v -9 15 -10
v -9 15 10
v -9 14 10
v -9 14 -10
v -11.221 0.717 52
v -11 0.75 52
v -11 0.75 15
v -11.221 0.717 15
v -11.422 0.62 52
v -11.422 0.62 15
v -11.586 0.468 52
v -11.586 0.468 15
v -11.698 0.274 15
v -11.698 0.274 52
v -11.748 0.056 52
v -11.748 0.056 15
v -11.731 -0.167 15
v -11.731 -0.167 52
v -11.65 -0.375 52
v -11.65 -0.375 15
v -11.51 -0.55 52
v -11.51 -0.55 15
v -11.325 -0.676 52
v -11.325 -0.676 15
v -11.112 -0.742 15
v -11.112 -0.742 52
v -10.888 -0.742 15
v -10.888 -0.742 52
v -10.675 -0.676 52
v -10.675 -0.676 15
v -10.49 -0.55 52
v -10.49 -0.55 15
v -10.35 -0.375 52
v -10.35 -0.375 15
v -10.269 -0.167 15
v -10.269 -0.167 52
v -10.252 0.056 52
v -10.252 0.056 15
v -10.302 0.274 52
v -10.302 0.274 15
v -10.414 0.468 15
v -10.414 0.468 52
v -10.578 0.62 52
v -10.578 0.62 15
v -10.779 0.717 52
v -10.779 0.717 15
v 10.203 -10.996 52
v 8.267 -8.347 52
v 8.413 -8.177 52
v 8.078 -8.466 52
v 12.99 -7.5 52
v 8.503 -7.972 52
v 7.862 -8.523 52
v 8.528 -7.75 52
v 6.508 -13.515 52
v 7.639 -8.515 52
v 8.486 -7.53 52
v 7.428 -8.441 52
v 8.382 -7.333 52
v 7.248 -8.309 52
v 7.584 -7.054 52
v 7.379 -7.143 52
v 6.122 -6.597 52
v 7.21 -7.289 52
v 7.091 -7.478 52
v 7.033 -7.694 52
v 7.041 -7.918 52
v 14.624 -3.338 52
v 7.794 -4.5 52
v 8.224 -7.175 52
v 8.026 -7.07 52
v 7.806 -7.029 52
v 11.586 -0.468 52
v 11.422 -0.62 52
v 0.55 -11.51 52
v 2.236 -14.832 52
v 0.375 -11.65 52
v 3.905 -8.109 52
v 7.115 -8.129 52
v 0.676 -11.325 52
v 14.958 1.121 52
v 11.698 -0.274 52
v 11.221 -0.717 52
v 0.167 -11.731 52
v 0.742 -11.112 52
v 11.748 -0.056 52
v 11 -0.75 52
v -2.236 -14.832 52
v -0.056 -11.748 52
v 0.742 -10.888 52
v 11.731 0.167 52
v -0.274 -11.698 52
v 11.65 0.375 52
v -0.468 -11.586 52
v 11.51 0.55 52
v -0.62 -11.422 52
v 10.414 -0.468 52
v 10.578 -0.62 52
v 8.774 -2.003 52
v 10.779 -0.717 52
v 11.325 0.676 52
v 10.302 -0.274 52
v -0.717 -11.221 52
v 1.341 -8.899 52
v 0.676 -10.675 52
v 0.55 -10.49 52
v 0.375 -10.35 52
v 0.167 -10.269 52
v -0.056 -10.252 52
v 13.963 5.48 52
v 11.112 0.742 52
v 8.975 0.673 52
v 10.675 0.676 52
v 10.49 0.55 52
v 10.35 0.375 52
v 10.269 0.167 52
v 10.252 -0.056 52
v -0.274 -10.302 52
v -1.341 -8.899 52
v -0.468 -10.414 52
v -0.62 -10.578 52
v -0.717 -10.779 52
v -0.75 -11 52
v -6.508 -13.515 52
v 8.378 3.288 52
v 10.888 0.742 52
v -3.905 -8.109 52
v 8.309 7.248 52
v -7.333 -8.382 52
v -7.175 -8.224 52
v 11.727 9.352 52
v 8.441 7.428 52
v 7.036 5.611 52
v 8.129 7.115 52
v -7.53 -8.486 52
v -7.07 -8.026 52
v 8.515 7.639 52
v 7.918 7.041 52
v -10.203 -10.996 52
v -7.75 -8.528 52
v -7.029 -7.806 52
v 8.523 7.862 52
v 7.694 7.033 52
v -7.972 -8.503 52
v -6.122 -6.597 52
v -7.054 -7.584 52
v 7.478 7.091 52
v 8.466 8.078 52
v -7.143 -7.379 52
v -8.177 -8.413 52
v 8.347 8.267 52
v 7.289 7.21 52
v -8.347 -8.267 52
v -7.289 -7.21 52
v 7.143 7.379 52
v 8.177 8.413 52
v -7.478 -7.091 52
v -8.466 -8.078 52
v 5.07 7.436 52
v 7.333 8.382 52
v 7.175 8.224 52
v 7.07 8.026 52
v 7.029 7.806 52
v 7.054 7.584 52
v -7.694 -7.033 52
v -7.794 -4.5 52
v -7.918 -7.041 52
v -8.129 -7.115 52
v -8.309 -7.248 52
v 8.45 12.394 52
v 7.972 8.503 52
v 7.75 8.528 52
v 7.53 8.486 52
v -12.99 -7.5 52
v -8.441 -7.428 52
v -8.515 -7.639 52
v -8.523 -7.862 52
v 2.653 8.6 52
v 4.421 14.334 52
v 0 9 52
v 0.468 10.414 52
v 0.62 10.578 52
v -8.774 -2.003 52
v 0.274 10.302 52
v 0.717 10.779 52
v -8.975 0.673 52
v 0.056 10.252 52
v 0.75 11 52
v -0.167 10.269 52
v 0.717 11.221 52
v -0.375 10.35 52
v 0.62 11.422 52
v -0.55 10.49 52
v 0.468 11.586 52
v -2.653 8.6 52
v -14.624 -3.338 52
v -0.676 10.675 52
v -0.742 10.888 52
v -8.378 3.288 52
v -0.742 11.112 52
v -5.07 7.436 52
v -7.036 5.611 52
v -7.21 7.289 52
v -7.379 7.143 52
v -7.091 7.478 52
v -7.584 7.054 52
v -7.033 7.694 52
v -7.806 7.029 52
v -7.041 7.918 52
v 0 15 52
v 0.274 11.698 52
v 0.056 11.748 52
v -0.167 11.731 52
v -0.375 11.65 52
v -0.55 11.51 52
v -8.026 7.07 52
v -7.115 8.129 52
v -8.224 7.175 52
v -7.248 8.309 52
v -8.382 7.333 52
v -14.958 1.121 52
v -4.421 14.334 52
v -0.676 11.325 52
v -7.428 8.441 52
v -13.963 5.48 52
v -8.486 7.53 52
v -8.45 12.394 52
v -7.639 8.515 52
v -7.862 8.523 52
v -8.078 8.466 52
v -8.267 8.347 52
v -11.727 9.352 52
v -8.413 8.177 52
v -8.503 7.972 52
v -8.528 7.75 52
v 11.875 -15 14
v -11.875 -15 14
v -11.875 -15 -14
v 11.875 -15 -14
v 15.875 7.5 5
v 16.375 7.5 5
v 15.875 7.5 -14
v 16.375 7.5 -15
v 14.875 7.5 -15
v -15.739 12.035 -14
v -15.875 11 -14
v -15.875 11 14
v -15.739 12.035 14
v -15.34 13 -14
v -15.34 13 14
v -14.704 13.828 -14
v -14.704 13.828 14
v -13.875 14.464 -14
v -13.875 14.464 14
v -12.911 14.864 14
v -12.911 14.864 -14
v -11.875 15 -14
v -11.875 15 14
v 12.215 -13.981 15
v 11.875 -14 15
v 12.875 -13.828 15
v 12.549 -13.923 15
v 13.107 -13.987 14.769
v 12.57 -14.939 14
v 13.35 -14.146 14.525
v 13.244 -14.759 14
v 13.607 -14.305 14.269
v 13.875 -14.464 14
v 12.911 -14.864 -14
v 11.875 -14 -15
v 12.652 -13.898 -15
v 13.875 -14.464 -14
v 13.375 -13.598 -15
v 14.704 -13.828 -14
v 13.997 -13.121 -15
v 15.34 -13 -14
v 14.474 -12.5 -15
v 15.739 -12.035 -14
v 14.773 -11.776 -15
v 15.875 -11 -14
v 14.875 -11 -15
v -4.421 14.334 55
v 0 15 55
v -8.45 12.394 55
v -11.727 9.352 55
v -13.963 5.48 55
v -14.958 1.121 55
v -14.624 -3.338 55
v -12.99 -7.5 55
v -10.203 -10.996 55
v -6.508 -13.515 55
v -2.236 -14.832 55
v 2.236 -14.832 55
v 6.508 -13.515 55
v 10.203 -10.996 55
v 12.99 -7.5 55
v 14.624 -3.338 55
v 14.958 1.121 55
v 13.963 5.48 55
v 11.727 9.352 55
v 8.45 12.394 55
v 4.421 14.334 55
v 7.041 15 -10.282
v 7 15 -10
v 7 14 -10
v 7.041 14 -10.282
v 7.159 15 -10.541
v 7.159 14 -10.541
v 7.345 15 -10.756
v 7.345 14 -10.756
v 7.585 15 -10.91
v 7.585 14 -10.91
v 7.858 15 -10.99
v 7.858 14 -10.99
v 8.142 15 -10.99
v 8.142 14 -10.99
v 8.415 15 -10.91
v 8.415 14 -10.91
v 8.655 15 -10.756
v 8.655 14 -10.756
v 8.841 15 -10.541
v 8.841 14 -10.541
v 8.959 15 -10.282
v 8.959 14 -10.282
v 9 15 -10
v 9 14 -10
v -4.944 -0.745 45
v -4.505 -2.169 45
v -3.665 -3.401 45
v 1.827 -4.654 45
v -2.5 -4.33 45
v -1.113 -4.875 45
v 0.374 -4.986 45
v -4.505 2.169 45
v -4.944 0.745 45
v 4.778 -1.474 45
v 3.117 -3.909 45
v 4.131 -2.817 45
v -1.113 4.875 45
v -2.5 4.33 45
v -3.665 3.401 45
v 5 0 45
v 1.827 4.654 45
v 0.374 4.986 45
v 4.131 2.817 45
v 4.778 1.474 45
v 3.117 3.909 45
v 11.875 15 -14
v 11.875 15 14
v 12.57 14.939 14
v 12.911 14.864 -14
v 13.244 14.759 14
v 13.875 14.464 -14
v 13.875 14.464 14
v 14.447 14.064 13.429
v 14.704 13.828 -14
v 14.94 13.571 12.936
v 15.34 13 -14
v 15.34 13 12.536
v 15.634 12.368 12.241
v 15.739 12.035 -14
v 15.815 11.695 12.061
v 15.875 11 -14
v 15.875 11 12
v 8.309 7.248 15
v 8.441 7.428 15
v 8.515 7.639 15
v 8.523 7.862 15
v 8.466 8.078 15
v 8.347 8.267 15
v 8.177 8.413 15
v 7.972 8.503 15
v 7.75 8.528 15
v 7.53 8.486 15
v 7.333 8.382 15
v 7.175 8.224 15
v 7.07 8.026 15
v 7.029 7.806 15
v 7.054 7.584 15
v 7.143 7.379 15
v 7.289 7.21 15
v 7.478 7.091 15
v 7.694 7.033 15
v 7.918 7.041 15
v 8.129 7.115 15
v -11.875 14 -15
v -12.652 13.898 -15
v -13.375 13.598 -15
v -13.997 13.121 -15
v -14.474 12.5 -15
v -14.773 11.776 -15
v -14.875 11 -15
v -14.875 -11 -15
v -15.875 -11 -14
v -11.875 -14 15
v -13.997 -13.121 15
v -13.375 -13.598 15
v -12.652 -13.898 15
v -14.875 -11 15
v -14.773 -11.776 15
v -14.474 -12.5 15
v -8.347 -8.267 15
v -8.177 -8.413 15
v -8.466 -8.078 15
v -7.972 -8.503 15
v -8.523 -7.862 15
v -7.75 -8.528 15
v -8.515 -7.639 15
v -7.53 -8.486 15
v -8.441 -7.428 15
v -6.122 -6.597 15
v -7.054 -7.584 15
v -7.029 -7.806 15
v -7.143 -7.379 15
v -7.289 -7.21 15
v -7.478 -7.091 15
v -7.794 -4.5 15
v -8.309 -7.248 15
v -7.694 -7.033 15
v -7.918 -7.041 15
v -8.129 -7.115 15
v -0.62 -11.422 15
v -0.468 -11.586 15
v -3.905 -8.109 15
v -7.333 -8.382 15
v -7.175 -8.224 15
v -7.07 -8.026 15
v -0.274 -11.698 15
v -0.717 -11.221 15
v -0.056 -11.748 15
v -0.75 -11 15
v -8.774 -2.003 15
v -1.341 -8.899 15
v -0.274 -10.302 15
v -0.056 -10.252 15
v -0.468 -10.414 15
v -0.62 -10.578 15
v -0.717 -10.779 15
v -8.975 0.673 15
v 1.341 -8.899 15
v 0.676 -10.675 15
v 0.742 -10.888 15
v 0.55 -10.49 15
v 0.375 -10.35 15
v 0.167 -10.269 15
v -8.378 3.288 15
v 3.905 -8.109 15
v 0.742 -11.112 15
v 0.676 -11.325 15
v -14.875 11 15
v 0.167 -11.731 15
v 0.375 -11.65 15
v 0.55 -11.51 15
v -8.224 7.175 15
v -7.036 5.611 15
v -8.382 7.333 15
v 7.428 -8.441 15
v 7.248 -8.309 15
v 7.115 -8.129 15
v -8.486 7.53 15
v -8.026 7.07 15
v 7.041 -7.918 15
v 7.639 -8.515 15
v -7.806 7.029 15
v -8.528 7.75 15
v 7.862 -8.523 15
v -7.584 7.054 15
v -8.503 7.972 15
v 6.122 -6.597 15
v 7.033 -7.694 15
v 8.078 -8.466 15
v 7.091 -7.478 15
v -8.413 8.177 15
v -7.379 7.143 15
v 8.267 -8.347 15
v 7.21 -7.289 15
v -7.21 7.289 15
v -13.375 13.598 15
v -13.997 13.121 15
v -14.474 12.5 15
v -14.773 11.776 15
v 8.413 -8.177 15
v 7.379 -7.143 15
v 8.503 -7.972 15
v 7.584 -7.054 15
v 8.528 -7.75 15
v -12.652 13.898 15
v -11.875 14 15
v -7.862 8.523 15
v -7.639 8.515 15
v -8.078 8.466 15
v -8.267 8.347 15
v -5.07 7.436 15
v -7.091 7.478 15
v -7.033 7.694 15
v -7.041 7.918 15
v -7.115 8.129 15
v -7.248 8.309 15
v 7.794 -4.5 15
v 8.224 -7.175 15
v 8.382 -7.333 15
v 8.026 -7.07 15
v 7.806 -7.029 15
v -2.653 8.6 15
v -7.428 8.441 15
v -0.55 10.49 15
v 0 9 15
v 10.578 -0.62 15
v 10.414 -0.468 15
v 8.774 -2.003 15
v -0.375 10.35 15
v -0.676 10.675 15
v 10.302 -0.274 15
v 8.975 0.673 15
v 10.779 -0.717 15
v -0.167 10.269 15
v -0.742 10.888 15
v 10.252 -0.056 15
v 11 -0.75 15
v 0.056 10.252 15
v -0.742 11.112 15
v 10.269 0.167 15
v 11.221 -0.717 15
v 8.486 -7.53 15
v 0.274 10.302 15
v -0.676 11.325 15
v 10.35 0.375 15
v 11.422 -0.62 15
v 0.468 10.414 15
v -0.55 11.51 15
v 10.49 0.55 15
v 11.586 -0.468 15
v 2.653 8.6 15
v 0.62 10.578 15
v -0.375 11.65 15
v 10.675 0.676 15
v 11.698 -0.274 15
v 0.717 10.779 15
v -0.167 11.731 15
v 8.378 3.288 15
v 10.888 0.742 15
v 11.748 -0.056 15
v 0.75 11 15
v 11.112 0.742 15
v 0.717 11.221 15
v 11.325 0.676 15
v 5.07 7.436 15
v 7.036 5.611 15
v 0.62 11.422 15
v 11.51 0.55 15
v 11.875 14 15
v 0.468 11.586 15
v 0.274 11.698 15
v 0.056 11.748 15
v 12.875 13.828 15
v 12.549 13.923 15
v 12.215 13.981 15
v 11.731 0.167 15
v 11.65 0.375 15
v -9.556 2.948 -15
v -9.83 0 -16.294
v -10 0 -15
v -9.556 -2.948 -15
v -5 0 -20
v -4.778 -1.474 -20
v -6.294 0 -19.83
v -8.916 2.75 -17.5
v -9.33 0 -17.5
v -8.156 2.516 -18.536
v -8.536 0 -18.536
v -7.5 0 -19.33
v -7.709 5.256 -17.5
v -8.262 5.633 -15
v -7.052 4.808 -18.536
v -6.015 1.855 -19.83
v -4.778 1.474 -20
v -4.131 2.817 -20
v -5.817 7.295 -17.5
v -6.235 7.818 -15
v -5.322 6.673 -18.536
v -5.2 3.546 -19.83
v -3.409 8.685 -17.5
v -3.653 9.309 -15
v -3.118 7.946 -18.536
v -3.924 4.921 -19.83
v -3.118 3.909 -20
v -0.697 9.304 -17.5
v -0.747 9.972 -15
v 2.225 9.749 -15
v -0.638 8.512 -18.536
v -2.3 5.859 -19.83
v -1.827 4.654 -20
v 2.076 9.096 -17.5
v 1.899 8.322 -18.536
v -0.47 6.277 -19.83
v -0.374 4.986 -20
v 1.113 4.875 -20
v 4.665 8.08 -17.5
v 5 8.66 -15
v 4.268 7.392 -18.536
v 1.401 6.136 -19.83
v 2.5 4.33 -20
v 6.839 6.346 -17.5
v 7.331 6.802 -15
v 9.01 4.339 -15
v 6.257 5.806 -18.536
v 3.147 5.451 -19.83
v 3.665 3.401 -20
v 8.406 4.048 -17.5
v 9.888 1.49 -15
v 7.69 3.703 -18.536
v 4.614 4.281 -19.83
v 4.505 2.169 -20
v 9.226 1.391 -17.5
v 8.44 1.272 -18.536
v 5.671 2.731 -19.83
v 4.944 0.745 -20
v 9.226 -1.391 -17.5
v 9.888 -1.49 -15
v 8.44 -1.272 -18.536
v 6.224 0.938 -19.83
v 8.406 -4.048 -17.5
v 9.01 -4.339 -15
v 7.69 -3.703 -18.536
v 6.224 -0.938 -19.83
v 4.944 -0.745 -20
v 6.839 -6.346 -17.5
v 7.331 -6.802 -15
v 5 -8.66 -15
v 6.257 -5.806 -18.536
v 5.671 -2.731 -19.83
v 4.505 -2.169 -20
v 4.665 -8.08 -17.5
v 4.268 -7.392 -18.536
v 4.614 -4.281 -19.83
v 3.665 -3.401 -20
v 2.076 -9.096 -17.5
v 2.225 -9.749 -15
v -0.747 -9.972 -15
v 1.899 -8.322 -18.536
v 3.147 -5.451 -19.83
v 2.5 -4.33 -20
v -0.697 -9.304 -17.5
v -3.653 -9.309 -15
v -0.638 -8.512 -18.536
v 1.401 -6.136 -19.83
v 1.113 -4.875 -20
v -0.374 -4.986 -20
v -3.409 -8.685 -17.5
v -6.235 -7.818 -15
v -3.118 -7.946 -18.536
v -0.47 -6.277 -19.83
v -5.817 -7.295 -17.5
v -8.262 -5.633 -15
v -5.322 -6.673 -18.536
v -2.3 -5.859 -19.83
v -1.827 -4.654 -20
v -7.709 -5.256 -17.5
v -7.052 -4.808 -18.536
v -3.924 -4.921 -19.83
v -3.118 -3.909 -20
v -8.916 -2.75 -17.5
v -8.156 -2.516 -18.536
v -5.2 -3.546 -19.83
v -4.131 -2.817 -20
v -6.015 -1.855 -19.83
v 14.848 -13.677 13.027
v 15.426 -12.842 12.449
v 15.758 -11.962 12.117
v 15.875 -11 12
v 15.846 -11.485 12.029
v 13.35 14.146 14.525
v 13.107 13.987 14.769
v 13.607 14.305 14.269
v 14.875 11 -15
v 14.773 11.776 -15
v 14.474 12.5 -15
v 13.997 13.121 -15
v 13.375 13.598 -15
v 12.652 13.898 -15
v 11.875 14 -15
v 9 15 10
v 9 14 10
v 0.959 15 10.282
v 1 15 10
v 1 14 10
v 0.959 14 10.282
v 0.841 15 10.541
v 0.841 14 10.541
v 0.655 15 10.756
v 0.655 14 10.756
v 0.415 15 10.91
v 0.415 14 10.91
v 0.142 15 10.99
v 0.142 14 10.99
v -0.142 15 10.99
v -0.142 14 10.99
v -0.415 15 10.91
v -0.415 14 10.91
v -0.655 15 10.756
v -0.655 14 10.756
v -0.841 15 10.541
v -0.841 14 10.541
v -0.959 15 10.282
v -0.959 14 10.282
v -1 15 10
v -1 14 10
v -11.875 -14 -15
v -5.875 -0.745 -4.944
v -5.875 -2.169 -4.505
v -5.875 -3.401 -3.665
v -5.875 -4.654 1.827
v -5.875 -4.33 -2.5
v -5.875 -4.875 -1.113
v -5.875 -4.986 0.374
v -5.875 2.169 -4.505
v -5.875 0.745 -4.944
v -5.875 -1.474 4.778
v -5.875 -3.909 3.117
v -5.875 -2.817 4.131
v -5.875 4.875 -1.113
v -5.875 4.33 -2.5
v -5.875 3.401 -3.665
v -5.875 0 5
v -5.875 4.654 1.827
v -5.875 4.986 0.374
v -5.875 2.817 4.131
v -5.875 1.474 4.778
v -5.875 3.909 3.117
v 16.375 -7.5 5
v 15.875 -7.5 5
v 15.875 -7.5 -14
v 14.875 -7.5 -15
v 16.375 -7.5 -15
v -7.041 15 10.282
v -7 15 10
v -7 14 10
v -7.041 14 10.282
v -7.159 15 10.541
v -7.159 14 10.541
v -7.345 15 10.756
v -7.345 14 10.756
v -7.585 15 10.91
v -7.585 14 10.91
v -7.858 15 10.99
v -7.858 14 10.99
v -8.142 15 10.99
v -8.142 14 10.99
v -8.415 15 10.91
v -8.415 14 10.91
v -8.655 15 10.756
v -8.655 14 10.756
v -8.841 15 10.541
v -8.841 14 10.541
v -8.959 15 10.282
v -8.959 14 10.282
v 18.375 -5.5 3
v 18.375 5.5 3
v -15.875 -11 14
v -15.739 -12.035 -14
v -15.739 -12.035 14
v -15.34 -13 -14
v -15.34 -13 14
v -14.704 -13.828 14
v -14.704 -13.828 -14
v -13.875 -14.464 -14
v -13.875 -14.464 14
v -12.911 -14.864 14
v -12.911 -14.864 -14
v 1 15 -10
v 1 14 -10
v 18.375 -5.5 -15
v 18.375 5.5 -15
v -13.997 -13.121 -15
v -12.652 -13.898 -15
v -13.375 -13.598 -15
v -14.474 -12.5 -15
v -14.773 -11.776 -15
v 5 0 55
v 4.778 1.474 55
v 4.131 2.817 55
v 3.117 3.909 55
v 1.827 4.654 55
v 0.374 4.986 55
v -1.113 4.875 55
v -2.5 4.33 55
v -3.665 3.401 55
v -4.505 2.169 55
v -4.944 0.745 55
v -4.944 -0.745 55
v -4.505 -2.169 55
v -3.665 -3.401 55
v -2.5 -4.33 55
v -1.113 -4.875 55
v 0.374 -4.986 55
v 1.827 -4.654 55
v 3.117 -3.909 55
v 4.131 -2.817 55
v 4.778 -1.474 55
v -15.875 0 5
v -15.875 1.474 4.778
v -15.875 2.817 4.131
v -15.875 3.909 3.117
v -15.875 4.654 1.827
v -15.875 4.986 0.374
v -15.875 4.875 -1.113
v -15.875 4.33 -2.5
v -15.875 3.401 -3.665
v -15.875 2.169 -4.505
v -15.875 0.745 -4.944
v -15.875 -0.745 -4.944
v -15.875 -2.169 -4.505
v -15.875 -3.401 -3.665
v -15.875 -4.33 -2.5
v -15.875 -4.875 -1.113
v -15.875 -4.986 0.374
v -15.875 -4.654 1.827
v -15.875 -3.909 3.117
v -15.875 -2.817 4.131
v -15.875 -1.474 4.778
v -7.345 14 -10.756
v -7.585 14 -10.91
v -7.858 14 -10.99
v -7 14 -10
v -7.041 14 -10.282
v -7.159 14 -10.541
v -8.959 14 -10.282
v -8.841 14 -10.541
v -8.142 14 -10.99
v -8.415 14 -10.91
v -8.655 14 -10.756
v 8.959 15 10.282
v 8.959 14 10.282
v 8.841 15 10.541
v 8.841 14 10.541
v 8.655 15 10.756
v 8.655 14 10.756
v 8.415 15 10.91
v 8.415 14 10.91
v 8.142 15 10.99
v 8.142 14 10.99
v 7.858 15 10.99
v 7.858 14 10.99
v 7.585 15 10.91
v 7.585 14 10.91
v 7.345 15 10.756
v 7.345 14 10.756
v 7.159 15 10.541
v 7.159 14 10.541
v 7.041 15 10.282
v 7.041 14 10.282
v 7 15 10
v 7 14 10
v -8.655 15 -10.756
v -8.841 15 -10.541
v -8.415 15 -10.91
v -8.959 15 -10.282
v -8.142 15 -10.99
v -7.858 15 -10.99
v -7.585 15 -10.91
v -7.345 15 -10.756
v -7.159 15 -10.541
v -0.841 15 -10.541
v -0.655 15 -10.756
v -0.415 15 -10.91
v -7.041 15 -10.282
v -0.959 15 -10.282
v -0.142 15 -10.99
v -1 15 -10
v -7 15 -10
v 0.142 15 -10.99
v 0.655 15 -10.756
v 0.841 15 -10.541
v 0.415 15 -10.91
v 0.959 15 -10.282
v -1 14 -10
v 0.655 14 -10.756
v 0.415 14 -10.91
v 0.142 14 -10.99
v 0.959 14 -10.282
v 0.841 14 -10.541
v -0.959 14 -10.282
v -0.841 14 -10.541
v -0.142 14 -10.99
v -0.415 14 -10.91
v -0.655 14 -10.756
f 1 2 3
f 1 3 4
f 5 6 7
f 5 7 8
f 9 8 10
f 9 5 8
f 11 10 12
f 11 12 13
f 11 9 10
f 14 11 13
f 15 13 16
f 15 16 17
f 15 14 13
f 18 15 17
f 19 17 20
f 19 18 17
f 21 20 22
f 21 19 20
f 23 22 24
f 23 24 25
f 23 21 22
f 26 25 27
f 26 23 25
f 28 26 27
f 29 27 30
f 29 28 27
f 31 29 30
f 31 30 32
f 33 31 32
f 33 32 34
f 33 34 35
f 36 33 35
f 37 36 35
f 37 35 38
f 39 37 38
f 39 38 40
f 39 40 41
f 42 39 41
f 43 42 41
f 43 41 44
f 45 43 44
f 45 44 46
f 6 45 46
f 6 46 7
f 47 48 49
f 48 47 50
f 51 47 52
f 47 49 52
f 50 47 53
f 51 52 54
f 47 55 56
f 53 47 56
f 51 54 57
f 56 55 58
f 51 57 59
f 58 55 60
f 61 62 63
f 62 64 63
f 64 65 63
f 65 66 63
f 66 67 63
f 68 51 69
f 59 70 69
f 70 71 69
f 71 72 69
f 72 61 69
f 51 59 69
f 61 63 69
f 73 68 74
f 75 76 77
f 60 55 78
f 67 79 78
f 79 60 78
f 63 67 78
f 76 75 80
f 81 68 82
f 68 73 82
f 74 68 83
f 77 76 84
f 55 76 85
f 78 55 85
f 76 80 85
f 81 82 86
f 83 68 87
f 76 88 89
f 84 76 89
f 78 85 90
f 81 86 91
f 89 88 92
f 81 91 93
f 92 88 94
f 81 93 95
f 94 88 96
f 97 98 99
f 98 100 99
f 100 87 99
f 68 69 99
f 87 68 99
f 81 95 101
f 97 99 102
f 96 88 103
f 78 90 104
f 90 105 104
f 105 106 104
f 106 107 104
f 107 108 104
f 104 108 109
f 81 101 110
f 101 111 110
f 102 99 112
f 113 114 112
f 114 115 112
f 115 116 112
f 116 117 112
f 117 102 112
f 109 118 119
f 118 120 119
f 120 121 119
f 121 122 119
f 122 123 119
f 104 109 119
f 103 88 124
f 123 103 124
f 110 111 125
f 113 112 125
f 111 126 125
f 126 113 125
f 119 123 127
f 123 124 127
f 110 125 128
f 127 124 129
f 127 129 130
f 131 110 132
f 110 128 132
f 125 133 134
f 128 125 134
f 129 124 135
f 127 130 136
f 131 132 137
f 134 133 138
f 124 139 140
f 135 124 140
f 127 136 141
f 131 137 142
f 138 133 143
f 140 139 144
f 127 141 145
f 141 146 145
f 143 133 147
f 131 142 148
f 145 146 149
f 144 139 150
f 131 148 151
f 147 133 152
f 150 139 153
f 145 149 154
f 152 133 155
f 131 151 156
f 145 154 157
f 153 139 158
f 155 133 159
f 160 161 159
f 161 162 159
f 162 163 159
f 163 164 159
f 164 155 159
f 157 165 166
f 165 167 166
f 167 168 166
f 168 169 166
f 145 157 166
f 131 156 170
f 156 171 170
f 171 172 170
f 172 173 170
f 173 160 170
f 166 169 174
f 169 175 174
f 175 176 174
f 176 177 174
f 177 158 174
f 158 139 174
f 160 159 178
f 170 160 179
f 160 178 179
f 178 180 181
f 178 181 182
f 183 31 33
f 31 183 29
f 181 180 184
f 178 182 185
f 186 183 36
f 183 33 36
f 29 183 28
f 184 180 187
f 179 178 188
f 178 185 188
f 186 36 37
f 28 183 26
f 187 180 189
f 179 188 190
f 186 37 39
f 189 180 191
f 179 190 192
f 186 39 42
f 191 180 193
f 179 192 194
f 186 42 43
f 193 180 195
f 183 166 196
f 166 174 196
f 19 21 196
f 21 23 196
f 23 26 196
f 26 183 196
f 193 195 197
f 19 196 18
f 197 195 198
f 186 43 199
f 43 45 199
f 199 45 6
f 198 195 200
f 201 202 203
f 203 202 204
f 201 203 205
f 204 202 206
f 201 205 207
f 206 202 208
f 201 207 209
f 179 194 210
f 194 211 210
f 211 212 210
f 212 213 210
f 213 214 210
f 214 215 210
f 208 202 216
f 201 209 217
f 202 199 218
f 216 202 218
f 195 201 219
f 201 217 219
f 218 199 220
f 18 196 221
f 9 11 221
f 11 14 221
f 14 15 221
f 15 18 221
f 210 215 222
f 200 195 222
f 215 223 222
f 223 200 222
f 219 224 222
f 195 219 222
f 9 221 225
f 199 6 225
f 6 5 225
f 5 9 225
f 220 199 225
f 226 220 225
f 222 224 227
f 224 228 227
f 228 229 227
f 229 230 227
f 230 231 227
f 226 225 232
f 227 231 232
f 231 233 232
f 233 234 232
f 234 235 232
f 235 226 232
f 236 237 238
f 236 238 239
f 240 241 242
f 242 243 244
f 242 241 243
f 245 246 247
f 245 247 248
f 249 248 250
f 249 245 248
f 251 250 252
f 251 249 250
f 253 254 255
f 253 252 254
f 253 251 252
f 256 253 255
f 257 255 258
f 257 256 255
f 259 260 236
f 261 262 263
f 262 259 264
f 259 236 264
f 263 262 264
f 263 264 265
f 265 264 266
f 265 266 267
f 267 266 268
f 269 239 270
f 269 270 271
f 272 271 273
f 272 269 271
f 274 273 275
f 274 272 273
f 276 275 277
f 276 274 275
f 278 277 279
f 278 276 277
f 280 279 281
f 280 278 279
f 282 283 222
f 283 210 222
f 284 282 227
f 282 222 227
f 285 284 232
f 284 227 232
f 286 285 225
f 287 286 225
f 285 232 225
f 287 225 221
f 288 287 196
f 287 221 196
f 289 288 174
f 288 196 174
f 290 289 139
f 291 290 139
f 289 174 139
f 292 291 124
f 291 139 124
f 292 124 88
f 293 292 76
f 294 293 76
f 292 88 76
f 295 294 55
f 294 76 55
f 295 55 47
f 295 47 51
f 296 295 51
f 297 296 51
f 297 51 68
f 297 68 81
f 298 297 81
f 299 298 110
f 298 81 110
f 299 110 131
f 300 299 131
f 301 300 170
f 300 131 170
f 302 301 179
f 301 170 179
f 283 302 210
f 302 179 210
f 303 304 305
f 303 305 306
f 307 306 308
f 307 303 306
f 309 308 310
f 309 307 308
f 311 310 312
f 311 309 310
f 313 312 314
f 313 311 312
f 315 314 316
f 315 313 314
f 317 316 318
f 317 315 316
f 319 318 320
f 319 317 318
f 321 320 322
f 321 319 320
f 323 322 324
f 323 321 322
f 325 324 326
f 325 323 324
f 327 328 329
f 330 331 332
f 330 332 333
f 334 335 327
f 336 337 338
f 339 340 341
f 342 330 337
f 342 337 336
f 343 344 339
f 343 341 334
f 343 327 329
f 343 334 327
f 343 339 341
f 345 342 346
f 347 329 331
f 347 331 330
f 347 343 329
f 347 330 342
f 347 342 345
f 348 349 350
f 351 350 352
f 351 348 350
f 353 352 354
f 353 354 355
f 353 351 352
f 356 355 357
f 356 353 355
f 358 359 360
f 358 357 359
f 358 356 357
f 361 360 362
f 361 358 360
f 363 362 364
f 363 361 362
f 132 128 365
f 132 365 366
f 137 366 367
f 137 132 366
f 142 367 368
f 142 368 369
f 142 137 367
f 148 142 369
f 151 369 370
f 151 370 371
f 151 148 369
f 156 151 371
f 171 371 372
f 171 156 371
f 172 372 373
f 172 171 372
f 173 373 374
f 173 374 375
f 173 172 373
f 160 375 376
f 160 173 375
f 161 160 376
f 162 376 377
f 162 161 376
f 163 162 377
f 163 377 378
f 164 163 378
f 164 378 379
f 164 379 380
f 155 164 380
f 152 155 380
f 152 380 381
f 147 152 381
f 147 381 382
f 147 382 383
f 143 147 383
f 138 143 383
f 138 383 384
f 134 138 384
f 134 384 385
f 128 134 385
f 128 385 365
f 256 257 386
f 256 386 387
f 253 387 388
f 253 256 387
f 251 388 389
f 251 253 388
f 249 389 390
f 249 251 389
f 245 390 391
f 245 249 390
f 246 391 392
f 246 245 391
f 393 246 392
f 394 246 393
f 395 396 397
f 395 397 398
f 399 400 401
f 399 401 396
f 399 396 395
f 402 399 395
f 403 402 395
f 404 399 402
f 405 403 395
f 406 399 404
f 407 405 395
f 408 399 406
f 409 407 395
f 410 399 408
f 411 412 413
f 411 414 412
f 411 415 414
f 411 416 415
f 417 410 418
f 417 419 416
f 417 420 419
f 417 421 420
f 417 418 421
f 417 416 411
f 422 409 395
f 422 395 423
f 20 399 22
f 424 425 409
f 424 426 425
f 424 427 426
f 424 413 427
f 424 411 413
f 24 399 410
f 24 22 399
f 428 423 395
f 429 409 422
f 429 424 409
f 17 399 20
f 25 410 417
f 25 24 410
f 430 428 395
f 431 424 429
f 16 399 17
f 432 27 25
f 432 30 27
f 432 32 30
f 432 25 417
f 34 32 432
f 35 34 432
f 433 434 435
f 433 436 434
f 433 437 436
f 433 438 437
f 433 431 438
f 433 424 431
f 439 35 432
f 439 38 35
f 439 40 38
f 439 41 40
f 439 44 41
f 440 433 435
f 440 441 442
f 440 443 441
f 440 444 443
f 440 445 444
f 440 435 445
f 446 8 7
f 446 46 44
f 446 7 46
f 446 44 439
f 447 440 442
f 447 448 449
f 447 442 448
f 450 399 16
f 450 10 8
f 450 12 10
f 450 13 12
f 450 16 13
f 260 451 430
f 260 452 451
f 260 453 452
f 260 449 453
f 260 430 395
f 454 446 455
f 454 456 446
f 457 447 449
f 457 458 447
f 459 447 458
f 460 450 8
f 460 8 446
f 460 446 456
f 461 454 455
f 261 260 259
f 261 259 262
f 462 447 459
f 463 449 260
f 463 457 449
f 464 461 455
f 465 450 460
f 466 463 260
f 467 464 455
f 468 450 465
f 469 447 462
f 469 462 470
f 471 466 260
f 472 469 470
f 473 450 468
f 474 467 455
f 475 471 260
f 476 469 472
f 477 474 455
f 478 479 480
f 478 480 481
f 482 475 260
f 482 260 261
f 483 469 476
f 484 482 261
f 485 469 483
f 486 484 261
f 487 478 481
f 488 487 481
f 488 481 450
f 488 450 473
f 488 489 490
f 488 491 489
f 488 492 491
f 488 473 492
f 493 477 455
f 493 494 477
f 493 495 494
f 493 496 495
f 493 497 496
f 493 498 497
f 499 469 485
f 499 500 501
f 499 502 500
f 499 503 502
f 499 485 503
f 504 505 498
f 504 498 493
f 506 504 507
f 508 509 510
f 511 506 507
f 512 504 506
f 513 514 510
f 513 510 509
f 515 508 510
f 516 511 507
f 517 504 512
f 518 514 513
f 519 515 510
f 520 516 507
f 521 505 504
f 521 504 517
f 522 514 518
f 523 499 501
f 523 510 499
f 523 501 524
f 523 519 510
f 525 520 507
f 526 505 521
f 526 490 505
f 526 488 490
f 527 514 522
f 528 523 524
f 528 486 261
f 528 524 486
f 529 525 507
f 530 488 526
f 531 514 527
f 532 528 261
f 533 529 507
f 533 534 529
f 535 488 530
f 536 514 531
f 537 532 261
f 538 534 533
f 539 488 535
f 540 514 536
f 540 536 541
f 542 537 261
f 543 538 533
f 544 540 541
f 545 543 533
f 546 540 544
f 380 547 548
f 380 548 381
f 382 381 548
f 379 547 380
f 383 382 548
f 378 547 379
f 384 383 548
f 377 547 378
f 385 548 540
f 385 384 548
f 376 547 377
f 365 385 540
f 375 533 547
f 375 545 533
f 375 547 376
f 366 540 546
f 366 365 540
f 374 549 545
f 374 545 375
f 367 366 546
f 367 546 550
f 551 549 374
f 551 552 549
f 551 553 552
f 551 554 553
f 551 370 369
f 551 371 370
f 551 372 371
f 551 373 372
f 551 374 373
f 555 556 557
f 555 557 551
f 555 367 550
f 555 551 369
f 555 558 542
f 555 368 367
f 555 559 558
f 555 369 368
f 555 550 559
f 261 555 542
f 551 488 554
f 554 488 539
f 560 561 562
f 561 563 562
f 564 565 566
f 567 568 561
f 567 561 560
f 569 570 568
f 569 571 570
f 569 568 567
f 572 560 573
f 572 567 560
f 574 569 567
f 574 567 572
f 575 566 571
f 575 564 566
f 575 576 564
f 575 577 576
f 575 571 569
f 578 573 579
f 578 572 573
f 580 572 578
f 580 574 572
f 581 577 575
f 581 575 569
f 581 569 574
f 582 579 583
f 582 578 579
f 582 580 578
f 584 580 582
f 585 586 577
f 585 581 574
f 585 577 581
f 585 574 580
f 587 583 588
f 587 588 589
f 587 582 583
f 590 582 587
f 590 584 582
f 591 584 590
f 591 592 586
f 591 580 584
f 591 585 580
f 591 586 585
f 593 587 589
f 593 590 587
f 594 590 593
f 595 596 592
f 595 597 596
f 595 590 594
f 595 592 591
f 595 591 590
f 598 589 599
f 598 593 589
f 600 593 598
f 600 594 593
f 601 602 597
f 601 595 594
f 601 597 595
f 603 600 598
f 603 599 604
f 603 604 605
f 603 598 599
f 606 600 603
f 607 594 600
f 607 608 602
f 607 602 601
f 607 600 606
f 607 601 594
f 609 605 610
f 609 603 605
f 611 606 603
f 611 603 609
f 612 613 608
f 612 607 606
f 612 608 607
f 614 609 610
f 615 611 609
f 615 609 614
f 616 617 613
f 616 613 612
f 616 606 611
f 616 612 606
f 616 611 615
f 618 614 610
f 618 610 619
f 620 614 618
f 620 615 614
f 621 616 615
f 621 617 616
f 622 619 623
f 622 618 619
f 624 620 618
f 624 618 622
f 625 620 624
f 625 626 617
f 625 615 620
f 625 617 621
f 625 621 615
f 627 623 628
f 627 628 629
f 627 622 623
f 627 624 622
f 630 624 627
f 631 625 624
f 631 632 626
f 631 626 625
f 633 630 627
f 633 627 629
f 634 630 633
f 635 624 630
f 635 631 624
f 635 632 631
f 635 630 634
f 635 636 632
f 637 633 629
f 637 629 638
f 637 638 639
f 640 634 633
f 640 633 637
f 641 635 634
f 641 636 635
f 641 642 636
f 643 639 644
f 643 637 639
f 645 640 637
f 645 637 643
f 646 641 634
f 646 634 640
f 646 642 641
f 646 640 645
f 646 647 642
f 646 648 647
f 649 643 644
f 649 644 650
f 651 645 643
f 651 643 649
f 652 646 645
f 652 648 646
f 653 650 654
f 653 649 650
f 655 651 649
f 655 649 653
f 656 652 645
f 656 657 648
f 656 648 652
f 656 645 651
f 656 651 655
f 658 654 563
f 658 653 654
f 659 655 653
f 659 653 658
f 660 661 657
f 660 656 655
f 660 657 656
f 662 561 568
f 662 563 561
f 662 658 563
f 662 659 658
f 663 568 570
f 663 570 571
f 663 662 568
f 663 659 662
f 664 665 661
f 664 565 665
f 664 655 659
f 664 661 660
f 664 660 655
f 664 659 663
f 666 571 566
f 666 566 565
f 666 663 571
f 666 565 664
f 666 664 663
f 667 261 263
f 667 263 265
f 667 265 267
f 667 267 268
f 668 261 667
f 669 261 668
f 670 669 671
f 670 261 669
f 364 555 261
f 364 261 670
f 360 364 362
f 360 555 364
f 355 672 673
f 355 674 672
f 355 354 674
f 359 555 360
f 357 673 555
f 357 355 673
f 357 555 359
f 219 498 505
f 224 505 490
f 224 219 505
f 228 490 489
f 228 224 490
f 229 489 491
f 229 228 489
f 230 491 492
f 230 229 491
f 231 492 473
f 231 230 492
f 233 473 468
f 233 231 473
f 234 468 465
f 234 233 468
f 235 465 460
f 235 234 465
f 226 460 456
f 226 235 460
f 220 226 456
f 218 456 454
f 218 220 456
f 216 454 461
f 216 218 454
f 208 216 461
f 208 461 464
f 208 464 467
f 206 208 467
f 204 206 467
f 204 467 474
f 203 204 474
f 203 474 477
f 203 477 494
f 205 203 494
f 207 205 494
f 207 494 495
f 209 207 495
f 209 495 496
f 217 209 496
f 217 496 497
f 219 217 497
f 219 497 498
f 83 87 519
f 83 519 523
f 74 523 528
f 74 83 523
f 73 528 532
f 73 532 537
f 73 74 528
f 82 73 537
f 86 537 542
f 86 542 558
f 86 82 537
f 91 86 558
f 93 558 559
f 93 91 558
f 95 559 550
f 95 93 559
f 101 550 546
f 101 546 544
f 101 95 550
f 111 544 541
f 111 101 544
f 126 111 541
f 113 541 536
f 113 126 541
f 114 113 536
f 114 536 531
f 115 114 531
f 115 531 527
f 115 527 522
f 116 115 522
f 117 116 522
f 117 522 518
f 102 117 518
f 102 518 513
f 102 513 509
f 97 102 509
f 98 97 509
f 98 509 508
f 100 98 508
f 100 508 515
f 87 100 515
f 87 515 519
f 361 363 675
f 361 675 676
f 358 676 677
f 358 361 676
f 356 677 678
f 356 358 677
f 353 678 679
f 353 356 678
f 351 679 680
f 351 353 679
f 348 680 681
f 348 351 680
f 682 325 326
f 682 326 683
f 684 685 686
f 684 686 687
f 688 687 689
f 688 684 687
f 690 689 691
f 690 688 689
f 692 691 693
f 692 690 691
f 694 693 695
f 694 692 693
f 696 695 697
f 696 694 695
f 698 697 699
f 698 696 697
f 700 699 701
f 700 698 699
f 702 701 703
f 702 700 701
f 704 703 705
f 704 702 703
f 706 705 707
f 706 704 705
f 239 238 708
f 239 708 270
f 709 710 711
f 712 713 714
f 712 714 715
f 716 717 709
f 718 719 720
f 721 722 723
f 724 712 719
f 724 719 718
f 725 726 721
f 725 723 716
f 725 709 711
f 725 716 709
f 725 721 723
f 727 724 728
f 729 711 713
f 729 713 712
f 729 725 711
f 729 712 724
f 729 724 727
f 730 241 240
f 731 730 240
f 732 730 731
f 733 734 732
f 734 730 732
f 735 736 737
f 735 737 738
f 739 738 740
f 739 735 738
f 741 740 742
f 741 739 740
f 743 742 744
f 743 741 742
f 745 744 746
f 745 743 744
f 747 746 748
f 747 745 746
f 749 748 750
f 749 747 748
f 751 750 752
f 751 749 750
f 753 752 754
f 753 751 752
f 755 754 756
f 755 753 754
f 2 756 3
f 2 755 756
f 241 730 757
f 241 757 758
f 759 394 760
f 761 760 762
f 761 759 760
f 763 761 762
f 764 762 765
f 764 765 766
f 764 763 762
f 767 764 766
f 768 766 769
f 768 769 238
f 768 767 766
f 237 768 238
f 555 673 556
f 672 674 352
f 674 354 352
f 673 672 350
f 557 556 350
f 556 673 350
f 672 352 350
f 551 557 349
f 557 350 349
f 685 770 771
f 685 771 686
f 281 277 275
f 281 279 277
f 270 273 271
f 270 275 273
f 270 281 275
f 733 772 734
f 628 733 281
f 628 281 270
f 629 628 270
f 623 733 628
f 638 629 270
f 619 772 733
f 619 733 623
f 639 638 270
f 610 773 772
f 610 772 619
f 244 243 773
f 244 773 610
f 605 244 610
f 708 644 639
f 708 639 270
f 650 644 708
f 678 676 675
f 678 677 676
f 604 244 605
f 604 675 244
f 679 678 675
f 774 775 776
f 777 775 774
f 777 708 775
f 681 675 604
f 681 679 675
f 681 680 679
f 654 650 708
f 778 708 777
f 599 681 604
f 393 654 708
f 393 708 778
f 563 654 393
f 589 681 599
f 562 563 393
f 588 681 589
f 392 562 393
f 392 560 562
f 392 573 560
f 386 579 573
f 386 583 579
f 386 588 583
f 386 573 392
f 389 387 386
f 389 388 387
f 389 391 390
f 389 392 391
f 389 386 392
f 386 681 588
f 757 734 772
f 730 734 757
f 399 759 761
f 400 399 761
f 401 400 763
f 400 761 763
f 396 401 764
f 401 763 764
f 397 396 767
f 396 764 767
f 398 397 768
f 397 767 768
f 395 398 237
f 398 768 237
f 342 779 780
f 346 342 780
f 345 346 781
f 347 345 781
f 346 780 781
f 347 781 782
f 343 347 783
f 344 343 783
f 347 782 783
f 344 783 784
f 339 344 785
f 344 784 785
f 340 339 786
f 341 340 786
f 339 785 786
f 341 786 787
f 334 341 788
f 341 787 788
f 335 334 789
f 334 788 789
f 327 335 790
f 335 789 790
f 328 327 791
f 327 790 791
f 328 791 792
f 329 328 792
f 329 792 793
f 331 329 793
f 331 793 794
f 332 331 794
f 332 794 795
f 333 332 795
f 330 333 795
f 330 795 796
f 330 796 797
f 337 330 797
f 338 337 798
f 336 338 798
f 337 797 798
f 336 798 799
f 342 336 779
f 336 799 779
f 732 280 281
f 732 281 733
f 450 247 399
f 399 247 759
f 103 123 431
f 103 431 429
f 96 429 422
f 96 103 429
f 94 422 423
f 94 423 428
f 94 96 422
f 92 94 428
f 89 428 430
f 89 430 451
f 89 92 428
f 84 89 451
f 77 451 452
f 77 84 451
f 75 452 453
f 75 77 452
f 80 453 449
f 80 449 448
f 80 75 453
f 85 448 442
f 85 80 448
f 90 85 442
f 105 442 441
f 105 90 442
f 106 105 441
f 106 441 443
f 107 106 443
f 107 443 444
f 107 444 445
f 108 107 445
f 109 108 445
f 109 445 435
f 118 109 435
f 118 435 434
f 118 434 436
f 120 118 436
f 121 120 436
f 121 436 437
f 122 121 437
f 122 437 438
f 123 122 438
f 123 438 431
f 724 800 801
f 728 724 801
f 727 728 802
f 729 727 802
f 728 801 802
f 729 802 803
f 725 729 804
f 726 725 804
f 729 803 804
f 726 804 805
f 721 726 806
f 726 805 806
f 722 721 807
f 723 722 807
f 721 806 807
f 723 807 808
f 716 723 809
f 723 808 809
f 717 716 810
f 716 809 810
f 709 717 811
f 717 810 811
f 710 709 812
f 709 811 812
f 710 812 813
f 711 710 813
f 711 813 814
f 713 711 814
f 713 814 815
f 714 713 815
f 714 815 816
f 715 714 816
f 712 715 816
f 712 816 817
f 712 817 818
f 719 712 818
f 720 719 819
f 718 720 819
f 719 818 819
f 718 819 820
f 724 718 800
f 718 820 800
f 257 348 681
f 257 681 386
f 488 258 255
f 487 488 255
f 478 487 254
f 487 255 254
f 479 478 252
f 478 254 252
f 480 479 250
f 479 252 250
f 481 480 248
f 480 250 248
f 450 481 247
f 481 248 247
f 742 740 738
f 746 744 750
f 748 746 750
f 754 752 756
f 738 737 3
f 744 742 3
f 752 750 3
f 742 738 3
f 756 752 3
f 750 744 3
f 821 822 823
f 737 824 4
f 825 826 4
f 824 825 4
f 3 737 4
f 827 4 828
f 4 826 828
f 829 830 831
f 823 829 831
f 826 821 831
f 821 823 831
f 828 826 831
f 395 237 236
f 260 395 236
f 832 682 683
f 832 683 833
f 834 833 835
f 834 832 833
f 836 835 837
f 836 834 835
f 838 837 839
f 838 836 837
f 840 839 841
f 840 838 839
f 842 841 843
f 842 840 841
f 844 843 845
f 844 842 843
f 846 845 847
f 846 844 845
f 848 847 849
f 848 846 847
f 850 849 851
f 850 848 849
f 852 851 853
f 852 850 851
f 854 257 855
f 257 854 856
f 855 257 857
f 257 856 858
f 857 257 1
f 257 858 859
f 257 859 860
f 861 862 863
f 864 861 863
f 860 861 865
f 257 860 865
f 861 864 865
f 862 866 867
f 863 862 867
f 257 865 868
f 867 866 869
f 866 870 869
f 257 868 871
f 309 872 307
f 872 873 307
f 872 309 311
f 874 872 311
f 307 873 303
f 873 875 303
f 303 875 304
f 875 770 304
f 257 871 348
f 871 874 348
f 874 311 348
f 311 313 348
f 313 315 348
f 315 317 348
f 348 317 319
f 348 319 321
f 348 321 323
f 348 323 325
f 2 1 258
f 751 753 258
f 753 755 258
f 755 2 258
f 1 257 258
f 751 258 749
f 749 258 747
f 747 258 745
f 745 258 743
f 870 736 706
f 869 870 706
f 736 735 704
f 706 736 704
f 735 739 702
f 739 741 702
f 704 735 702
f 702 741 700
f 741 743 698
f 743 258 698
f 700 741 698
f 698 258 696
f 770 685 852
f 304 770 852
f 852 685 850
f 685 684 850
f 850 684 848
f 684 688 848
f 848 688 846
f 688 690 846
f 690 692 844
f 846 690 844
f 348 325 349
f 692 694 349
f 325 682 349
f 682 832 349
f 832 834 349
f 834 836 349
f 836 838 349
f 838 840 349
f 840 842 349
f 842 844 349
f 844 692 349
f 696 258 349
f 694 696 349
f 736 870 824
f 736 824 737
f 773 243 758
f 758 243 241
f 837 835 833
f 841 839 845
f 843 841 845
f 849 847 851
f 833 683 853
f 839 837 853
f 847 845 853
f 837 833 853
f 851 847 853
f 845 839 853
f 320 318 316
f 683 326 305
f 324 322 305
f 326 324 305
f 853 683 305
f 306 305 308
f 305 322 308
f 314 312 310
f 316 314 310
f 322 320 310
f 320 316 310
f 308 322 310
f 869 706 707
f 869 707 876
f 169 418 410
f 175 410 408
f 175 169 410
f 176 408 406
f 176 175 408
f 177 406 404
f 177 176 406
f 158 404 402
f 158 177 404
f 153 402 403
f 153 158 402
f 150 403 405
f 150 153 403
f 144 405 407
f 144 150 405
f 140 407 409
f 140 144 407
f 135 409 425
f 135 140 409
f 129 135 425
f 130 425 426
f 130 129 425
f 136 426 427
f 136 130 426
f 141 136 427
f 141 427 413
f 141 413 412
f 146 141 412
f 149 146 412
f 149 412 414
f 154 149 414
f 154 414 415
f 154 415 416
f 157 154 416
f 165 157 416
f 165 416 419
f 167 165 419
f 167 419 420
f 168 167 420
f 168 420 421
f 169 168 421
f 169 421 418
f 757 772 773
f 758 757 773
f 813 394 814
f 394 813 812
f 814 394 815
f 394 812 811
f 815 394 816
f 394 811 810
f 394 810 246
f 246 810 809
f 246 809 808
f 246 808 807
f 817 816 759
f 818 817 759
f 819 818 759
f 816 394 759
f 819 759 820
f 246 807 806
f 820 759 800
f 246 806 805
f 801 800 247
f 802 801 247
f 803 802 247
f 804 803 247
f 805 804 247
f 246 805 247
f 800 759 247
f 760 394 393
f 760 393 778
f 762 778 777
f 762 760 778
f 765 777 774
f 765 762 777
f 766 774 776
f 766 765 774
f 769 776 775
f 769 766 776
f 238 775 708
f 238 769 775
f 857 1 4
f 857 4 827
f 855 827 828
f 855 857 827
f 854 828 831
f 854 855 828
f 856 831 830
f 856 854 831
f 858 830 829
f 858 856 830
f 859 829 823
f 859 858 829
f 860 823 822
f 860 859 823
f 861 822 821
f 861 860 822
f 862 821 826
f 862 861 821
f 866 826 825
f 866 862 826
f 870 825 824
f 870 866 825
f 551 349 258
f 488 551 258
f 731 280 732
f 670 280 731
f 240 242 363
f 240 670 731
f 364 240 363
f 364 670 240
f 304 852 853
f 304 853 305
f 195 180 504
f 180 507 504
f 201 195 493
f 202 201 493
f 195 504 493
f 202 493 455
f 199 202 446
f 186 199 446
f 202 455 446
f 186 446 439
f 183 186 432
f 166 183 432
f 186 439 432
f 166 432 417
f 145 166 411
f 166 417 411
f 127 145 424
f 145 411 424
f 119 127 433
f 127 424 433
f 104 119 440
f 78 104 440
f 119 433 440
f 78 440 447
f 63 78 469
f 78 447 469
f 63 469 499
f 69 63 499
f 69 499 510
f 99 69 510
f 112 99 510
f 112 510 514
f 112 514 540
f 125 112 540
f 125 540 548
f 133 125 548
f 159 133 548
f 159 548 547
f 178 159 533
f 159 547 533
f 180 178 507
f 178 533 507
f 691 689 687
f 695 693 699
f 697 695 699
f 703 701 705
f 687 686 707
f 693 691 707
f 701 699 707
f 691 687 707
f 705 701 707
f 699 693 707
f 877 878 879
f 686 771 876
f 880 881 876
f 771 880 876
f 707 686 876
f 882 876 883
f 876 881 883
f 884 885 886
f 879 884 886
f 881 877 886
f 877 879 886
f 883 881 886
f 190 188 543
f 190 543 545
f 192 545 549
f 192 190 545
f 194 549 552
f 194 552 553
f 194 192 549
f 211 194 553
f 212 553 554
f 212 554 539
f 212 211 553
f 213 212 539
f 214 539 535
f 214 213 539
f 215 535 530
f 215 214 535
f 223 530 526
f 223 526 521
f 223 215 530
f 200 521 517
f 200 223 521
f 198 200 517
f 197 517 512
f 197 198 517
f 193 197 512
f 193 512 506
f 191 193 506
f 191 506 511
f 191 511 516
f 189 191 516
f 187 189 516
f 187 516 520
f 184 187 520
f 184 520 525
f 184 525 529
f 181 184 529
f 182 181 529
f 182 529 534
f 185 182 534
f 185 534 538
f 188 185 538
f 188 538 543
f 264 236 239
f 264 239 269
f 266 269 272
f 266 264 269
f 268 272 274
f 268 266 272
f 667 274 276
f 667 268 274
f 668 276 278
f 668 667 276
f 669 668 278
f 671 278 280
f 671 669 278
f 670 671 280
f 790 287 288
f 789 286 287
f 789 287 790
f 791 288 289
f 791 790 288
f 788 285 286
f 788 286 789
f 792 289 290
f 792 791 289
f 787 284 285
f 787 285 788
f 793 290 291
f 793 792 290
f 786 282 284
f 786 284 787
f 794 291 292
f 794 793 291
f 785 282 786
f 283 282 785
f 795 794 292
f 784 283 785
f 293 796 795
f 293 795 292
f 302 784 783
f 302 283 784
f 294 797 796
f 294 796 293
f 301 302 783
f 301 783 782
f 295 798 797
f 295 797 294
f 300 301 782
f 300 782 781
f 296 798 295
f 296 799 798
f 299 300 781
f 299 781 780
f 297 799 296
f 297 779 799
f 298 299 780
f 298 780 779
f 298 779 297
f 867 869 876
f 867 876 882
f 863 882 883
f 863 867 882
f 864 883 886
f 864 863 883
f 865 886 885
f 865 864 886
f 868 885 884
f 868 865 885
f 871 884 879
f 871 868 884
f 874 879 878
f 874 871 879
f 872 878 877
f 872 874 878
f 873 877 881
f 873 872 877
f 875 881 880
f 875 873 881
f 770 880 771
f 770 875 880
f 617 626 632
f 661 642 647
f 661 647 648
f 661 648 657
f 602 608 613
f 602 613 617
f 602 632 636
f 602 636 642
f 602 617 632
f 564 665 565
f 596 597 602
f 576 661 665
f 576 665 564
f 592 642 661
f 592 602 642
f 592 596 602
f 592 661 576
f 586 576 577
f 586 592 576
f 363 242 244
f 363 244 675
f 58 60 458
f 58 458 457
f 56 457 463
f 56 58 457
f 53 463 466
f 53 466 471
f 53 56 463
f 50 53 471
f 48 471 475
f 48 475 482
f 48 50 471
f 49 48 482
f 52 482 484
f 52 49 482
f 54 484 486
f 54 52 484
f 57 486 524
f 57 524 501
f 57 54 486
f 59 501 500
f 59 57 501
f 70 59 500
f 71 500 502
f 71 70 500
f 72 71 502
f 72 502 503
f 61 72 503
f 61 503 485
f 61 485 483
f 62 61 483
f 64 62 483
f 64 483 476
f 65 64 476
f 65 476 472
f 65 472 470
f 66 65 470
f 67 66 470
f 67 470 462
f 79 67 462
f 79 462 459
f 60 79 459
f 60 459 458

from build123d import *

# Parameters (mm, degrees)
SKETCH2_W           = 31.750972762
SKETCH2_H           = 30
BOSS_EXTRUDE1_DEPTH = 15
FILLET1_R           = 4
CHAMFER1_SIZE       = 3
CHAMFER2_SIZE       = 1
SKETCH4_R           = 10
BOSS_EXTRUDE2_DEPTH = 5
FILLET2_R           = 5
SKETCH5_W           = 5
SKETCH5_H           = 15
BOSS_EXTRUDE3_DEPTH = 20
CHAMFER3_SIZE       = 2
SKETCH6_R           = 5
CUT_EXTRUDE1_DEPTH  = 10
SKETCH7_R           = 0.75
BOSS_EXTRUDE4_DEPTH = 40
CIRPATTERN2_COUNT   = 8
SKETCH8_R           = 5
CUT_EXTRUDE2_DEPTH  = 10
CUT_EXTRUDE3_DEPTH  = 1
LPATTERN3_COUNT     = 2
LPATTERN3_PITCH     = 8
LPATTERN3_COL_COUNT = 2
LPATTERN3_COL_PITCH = 8


# Some blends are built 0.0001 mm under size
with BuildPart() as part:
    # Sketch2 → Boss-Extrude1 (new, symmetric)
    with BuildSketch(Plane.XY):
        Rectangle(SKETCH2_W, SKETCH2_H)
    extrude(amount=BOSS_EXTRUDE1_DEPTH, both=True)

    # Sketch3 → Revolve1 (revolve)
    with BuildSketch(Plane(origin=(0, 0, 0), x_dir=(0, 0, -1), z_dir=(1, 0, 0))):
        Polygon((-55, 0), (-55, 15), (-52, 15), (-52, 9), (-15, 9), (-15, 0), align=None)
    revolve(axis=Axis((0, 0, 15), (0, 0, 1)))

    # Fillet1
    fillet1_edges = [part.edges().sort_by_distance(p)[0] for p in [
        (15.875486381, -15, 0),
        (-15.875486381, -15, 0),
        (-15.875486381, 15, 0),
        (15.875486381, 15, 0),
    ]]
    fillet(fillet1_edges, radius=FILLET1_R)

    # Chamfer1
    # the kernel refuses this chamfer: 3 mm, written as the material it takes off along each edge
    with BuildSketch(Plane(origin=(15.875486381, 18.715048964, 15), x_dir=(-0.9996219169112969, 0, 0.02749587661058621), z_dir=(0, -1, 0))) as chamfer1_piece_1:
        Polygon((CHAMFER1_SIZE * 0.999621916911, CHAMFER1_SIZE * 0.0274958766106), (-CHAMFER1_SIZE * 0.0274958766106, CHAMFER1_SIZE * 0.999621916911), (0, 0), align=None)
    extrude(amount=37.430097928, mode=Mode.SUBTRACT)

    # Chamfer2
    chamfer2_edges = [part.edges().sort_by_distance(p)[0] for p in [
        (0, -15, -15),
        (14.703913506, -13.828427125, -15),
        (-14.703913506, -13.828427125, -15),
        (15.875486381, 0, -15),
        (-15.875486381, 0, -15),
        (14.703913506, 13.828427125, -15),
        (-14.703913506, 13.828427125, -15),
        (0, 15, -15),
        (12.379503551, -14.968118785, 15),
        (0, -15, 15),
        (-14.703913506, -13.828427125, 15),
        (-15.875486381, 0, 15),
        (12.379503551, 14.968118785, 15),
        (-14.703913506, 13.828427125, 15),
        (0, 15, 15),
    ]]
    chamfer(chamfer2_edges, length=CHAMFER2_SIZE)

    # Sketch4 → Boss-Extrude2 (add)
    with BuildSketch(Plane(origin=(0, 0, -15), x_dir=(-1, 0, 0), z_dir=(0, 0, -1))):
        Circle(SKETCH4_R)
    extrude(amount=BOSS_EXTRUDE2_DEPTH)

    # Fillet2
    fillet2_edges = [part.edges().sort_by_distance(p)[0] for p in [
        (10, 0, -20),
    ]]
    fillet(fillet2_edges, radius=FILLET2_R - 0.0001)  # a hair under: the kernel refuses the full size

    # Sketch5 → Boss-Extrude3 (add)
    with BuildSketch(Plane(origin=(0, 0, -15), x_dir=(-1, 0, 0), z_dir=(0, 0, -1))):
        with Locations((-15.875486381, 0)):
            Rectangle(SKETCH5_W, SKETCH5_H)
    extrude(amount=-BOSS_EXTRUDE3_DEPTH)

    # Chamfer3
    chamfer3_edges = [part.edges().sort_by_distance(p)[0] for p in [
        (18.375486381, 7.5, -5),
        (18.375486381, 0, 5),
        (18.375486381, -7.5, -5),
    ]]
    chamfer(chamfer3_edges, length=CHAMFER3_SIZE)

    # Sketch6 → Cut-Extrude1 (cut)
    with BuildSketch(Plane.XY.offset(55)):
        Circle(SKETCH6_R)
    extrude(amount=-CUT_EXTRUDE1_DEPTH, mode=Mode.SUBTRACT)

    # Sketch7 → Boss-Extrude4 (add)
    with BuildSketch(Plane.XY.offset(55)):
        with Locations((0, 11)):
            Circle(SKETCH7_R)
    boss_extrude4 = extrude(amount=-BOSS_EXTRUDE4_DEPTH)

    # CirPattern2: Boss-Extrude4 ×8 about axis
    cirpattern2_axis = Axis((0, 0, 0), (0, 0, 1))
    for i in range(1, CIRPATTERN2_COUNT):
        add(boss_extrude4.rotate(cirpattern2_axis, i * 360 / CIRPATTERN2_COUNT))

    # Sketch8 → Cut-Extrude2 (cut)
    with BuildSketch(Plane.ZY.offset(15.875486381)):
        Circle(SKETCH8_R)
    extrude(amount=-CUT_EXTRUDE2_DEPTH, mode=Mode.SUBTRACT)

    # Sketch9 → Cut-Extrude3 (cut)
    with BuildSketch(Plane(origin=(0, 15, 0), x_dir=(1, 0, 0), z_dir=(0, 1, 0))):
        with BuildLine():
            Line((1, 10), (1, -10))
            ThreePointArc((1, -10), (0, -11), (-1, -10))
            Line((-1, -10), (-1, 10))
            ThreePointArc((-1, 10), (0, 11), (1, 10))
        make_face()
    cut_extrude3 = extrude(amount=-CUT_EXTRUDE3_DEPTH, mode=Mode.SUBTRACT)

    # LPattern3: Cut-Extrude3 ×2
    with Locations(*[(-i * LPATTERN3_PITCH, 0, 0) for i in range(1, LPATTERN3_COUNT)]):
        add(cut_extrude3, mode=Mode.SUBTRACT)

    # LPattern3 col: Cut-Extrude3 ×2
    with Locations(*[(i * LPATTERN3_COL_PITCH, 0, 0) for i in range(1, LPATTERN3_COL_COUNT)]):
        add(cut_extrude3, mode=Mode.SUBTRACT)


solid = part.part
